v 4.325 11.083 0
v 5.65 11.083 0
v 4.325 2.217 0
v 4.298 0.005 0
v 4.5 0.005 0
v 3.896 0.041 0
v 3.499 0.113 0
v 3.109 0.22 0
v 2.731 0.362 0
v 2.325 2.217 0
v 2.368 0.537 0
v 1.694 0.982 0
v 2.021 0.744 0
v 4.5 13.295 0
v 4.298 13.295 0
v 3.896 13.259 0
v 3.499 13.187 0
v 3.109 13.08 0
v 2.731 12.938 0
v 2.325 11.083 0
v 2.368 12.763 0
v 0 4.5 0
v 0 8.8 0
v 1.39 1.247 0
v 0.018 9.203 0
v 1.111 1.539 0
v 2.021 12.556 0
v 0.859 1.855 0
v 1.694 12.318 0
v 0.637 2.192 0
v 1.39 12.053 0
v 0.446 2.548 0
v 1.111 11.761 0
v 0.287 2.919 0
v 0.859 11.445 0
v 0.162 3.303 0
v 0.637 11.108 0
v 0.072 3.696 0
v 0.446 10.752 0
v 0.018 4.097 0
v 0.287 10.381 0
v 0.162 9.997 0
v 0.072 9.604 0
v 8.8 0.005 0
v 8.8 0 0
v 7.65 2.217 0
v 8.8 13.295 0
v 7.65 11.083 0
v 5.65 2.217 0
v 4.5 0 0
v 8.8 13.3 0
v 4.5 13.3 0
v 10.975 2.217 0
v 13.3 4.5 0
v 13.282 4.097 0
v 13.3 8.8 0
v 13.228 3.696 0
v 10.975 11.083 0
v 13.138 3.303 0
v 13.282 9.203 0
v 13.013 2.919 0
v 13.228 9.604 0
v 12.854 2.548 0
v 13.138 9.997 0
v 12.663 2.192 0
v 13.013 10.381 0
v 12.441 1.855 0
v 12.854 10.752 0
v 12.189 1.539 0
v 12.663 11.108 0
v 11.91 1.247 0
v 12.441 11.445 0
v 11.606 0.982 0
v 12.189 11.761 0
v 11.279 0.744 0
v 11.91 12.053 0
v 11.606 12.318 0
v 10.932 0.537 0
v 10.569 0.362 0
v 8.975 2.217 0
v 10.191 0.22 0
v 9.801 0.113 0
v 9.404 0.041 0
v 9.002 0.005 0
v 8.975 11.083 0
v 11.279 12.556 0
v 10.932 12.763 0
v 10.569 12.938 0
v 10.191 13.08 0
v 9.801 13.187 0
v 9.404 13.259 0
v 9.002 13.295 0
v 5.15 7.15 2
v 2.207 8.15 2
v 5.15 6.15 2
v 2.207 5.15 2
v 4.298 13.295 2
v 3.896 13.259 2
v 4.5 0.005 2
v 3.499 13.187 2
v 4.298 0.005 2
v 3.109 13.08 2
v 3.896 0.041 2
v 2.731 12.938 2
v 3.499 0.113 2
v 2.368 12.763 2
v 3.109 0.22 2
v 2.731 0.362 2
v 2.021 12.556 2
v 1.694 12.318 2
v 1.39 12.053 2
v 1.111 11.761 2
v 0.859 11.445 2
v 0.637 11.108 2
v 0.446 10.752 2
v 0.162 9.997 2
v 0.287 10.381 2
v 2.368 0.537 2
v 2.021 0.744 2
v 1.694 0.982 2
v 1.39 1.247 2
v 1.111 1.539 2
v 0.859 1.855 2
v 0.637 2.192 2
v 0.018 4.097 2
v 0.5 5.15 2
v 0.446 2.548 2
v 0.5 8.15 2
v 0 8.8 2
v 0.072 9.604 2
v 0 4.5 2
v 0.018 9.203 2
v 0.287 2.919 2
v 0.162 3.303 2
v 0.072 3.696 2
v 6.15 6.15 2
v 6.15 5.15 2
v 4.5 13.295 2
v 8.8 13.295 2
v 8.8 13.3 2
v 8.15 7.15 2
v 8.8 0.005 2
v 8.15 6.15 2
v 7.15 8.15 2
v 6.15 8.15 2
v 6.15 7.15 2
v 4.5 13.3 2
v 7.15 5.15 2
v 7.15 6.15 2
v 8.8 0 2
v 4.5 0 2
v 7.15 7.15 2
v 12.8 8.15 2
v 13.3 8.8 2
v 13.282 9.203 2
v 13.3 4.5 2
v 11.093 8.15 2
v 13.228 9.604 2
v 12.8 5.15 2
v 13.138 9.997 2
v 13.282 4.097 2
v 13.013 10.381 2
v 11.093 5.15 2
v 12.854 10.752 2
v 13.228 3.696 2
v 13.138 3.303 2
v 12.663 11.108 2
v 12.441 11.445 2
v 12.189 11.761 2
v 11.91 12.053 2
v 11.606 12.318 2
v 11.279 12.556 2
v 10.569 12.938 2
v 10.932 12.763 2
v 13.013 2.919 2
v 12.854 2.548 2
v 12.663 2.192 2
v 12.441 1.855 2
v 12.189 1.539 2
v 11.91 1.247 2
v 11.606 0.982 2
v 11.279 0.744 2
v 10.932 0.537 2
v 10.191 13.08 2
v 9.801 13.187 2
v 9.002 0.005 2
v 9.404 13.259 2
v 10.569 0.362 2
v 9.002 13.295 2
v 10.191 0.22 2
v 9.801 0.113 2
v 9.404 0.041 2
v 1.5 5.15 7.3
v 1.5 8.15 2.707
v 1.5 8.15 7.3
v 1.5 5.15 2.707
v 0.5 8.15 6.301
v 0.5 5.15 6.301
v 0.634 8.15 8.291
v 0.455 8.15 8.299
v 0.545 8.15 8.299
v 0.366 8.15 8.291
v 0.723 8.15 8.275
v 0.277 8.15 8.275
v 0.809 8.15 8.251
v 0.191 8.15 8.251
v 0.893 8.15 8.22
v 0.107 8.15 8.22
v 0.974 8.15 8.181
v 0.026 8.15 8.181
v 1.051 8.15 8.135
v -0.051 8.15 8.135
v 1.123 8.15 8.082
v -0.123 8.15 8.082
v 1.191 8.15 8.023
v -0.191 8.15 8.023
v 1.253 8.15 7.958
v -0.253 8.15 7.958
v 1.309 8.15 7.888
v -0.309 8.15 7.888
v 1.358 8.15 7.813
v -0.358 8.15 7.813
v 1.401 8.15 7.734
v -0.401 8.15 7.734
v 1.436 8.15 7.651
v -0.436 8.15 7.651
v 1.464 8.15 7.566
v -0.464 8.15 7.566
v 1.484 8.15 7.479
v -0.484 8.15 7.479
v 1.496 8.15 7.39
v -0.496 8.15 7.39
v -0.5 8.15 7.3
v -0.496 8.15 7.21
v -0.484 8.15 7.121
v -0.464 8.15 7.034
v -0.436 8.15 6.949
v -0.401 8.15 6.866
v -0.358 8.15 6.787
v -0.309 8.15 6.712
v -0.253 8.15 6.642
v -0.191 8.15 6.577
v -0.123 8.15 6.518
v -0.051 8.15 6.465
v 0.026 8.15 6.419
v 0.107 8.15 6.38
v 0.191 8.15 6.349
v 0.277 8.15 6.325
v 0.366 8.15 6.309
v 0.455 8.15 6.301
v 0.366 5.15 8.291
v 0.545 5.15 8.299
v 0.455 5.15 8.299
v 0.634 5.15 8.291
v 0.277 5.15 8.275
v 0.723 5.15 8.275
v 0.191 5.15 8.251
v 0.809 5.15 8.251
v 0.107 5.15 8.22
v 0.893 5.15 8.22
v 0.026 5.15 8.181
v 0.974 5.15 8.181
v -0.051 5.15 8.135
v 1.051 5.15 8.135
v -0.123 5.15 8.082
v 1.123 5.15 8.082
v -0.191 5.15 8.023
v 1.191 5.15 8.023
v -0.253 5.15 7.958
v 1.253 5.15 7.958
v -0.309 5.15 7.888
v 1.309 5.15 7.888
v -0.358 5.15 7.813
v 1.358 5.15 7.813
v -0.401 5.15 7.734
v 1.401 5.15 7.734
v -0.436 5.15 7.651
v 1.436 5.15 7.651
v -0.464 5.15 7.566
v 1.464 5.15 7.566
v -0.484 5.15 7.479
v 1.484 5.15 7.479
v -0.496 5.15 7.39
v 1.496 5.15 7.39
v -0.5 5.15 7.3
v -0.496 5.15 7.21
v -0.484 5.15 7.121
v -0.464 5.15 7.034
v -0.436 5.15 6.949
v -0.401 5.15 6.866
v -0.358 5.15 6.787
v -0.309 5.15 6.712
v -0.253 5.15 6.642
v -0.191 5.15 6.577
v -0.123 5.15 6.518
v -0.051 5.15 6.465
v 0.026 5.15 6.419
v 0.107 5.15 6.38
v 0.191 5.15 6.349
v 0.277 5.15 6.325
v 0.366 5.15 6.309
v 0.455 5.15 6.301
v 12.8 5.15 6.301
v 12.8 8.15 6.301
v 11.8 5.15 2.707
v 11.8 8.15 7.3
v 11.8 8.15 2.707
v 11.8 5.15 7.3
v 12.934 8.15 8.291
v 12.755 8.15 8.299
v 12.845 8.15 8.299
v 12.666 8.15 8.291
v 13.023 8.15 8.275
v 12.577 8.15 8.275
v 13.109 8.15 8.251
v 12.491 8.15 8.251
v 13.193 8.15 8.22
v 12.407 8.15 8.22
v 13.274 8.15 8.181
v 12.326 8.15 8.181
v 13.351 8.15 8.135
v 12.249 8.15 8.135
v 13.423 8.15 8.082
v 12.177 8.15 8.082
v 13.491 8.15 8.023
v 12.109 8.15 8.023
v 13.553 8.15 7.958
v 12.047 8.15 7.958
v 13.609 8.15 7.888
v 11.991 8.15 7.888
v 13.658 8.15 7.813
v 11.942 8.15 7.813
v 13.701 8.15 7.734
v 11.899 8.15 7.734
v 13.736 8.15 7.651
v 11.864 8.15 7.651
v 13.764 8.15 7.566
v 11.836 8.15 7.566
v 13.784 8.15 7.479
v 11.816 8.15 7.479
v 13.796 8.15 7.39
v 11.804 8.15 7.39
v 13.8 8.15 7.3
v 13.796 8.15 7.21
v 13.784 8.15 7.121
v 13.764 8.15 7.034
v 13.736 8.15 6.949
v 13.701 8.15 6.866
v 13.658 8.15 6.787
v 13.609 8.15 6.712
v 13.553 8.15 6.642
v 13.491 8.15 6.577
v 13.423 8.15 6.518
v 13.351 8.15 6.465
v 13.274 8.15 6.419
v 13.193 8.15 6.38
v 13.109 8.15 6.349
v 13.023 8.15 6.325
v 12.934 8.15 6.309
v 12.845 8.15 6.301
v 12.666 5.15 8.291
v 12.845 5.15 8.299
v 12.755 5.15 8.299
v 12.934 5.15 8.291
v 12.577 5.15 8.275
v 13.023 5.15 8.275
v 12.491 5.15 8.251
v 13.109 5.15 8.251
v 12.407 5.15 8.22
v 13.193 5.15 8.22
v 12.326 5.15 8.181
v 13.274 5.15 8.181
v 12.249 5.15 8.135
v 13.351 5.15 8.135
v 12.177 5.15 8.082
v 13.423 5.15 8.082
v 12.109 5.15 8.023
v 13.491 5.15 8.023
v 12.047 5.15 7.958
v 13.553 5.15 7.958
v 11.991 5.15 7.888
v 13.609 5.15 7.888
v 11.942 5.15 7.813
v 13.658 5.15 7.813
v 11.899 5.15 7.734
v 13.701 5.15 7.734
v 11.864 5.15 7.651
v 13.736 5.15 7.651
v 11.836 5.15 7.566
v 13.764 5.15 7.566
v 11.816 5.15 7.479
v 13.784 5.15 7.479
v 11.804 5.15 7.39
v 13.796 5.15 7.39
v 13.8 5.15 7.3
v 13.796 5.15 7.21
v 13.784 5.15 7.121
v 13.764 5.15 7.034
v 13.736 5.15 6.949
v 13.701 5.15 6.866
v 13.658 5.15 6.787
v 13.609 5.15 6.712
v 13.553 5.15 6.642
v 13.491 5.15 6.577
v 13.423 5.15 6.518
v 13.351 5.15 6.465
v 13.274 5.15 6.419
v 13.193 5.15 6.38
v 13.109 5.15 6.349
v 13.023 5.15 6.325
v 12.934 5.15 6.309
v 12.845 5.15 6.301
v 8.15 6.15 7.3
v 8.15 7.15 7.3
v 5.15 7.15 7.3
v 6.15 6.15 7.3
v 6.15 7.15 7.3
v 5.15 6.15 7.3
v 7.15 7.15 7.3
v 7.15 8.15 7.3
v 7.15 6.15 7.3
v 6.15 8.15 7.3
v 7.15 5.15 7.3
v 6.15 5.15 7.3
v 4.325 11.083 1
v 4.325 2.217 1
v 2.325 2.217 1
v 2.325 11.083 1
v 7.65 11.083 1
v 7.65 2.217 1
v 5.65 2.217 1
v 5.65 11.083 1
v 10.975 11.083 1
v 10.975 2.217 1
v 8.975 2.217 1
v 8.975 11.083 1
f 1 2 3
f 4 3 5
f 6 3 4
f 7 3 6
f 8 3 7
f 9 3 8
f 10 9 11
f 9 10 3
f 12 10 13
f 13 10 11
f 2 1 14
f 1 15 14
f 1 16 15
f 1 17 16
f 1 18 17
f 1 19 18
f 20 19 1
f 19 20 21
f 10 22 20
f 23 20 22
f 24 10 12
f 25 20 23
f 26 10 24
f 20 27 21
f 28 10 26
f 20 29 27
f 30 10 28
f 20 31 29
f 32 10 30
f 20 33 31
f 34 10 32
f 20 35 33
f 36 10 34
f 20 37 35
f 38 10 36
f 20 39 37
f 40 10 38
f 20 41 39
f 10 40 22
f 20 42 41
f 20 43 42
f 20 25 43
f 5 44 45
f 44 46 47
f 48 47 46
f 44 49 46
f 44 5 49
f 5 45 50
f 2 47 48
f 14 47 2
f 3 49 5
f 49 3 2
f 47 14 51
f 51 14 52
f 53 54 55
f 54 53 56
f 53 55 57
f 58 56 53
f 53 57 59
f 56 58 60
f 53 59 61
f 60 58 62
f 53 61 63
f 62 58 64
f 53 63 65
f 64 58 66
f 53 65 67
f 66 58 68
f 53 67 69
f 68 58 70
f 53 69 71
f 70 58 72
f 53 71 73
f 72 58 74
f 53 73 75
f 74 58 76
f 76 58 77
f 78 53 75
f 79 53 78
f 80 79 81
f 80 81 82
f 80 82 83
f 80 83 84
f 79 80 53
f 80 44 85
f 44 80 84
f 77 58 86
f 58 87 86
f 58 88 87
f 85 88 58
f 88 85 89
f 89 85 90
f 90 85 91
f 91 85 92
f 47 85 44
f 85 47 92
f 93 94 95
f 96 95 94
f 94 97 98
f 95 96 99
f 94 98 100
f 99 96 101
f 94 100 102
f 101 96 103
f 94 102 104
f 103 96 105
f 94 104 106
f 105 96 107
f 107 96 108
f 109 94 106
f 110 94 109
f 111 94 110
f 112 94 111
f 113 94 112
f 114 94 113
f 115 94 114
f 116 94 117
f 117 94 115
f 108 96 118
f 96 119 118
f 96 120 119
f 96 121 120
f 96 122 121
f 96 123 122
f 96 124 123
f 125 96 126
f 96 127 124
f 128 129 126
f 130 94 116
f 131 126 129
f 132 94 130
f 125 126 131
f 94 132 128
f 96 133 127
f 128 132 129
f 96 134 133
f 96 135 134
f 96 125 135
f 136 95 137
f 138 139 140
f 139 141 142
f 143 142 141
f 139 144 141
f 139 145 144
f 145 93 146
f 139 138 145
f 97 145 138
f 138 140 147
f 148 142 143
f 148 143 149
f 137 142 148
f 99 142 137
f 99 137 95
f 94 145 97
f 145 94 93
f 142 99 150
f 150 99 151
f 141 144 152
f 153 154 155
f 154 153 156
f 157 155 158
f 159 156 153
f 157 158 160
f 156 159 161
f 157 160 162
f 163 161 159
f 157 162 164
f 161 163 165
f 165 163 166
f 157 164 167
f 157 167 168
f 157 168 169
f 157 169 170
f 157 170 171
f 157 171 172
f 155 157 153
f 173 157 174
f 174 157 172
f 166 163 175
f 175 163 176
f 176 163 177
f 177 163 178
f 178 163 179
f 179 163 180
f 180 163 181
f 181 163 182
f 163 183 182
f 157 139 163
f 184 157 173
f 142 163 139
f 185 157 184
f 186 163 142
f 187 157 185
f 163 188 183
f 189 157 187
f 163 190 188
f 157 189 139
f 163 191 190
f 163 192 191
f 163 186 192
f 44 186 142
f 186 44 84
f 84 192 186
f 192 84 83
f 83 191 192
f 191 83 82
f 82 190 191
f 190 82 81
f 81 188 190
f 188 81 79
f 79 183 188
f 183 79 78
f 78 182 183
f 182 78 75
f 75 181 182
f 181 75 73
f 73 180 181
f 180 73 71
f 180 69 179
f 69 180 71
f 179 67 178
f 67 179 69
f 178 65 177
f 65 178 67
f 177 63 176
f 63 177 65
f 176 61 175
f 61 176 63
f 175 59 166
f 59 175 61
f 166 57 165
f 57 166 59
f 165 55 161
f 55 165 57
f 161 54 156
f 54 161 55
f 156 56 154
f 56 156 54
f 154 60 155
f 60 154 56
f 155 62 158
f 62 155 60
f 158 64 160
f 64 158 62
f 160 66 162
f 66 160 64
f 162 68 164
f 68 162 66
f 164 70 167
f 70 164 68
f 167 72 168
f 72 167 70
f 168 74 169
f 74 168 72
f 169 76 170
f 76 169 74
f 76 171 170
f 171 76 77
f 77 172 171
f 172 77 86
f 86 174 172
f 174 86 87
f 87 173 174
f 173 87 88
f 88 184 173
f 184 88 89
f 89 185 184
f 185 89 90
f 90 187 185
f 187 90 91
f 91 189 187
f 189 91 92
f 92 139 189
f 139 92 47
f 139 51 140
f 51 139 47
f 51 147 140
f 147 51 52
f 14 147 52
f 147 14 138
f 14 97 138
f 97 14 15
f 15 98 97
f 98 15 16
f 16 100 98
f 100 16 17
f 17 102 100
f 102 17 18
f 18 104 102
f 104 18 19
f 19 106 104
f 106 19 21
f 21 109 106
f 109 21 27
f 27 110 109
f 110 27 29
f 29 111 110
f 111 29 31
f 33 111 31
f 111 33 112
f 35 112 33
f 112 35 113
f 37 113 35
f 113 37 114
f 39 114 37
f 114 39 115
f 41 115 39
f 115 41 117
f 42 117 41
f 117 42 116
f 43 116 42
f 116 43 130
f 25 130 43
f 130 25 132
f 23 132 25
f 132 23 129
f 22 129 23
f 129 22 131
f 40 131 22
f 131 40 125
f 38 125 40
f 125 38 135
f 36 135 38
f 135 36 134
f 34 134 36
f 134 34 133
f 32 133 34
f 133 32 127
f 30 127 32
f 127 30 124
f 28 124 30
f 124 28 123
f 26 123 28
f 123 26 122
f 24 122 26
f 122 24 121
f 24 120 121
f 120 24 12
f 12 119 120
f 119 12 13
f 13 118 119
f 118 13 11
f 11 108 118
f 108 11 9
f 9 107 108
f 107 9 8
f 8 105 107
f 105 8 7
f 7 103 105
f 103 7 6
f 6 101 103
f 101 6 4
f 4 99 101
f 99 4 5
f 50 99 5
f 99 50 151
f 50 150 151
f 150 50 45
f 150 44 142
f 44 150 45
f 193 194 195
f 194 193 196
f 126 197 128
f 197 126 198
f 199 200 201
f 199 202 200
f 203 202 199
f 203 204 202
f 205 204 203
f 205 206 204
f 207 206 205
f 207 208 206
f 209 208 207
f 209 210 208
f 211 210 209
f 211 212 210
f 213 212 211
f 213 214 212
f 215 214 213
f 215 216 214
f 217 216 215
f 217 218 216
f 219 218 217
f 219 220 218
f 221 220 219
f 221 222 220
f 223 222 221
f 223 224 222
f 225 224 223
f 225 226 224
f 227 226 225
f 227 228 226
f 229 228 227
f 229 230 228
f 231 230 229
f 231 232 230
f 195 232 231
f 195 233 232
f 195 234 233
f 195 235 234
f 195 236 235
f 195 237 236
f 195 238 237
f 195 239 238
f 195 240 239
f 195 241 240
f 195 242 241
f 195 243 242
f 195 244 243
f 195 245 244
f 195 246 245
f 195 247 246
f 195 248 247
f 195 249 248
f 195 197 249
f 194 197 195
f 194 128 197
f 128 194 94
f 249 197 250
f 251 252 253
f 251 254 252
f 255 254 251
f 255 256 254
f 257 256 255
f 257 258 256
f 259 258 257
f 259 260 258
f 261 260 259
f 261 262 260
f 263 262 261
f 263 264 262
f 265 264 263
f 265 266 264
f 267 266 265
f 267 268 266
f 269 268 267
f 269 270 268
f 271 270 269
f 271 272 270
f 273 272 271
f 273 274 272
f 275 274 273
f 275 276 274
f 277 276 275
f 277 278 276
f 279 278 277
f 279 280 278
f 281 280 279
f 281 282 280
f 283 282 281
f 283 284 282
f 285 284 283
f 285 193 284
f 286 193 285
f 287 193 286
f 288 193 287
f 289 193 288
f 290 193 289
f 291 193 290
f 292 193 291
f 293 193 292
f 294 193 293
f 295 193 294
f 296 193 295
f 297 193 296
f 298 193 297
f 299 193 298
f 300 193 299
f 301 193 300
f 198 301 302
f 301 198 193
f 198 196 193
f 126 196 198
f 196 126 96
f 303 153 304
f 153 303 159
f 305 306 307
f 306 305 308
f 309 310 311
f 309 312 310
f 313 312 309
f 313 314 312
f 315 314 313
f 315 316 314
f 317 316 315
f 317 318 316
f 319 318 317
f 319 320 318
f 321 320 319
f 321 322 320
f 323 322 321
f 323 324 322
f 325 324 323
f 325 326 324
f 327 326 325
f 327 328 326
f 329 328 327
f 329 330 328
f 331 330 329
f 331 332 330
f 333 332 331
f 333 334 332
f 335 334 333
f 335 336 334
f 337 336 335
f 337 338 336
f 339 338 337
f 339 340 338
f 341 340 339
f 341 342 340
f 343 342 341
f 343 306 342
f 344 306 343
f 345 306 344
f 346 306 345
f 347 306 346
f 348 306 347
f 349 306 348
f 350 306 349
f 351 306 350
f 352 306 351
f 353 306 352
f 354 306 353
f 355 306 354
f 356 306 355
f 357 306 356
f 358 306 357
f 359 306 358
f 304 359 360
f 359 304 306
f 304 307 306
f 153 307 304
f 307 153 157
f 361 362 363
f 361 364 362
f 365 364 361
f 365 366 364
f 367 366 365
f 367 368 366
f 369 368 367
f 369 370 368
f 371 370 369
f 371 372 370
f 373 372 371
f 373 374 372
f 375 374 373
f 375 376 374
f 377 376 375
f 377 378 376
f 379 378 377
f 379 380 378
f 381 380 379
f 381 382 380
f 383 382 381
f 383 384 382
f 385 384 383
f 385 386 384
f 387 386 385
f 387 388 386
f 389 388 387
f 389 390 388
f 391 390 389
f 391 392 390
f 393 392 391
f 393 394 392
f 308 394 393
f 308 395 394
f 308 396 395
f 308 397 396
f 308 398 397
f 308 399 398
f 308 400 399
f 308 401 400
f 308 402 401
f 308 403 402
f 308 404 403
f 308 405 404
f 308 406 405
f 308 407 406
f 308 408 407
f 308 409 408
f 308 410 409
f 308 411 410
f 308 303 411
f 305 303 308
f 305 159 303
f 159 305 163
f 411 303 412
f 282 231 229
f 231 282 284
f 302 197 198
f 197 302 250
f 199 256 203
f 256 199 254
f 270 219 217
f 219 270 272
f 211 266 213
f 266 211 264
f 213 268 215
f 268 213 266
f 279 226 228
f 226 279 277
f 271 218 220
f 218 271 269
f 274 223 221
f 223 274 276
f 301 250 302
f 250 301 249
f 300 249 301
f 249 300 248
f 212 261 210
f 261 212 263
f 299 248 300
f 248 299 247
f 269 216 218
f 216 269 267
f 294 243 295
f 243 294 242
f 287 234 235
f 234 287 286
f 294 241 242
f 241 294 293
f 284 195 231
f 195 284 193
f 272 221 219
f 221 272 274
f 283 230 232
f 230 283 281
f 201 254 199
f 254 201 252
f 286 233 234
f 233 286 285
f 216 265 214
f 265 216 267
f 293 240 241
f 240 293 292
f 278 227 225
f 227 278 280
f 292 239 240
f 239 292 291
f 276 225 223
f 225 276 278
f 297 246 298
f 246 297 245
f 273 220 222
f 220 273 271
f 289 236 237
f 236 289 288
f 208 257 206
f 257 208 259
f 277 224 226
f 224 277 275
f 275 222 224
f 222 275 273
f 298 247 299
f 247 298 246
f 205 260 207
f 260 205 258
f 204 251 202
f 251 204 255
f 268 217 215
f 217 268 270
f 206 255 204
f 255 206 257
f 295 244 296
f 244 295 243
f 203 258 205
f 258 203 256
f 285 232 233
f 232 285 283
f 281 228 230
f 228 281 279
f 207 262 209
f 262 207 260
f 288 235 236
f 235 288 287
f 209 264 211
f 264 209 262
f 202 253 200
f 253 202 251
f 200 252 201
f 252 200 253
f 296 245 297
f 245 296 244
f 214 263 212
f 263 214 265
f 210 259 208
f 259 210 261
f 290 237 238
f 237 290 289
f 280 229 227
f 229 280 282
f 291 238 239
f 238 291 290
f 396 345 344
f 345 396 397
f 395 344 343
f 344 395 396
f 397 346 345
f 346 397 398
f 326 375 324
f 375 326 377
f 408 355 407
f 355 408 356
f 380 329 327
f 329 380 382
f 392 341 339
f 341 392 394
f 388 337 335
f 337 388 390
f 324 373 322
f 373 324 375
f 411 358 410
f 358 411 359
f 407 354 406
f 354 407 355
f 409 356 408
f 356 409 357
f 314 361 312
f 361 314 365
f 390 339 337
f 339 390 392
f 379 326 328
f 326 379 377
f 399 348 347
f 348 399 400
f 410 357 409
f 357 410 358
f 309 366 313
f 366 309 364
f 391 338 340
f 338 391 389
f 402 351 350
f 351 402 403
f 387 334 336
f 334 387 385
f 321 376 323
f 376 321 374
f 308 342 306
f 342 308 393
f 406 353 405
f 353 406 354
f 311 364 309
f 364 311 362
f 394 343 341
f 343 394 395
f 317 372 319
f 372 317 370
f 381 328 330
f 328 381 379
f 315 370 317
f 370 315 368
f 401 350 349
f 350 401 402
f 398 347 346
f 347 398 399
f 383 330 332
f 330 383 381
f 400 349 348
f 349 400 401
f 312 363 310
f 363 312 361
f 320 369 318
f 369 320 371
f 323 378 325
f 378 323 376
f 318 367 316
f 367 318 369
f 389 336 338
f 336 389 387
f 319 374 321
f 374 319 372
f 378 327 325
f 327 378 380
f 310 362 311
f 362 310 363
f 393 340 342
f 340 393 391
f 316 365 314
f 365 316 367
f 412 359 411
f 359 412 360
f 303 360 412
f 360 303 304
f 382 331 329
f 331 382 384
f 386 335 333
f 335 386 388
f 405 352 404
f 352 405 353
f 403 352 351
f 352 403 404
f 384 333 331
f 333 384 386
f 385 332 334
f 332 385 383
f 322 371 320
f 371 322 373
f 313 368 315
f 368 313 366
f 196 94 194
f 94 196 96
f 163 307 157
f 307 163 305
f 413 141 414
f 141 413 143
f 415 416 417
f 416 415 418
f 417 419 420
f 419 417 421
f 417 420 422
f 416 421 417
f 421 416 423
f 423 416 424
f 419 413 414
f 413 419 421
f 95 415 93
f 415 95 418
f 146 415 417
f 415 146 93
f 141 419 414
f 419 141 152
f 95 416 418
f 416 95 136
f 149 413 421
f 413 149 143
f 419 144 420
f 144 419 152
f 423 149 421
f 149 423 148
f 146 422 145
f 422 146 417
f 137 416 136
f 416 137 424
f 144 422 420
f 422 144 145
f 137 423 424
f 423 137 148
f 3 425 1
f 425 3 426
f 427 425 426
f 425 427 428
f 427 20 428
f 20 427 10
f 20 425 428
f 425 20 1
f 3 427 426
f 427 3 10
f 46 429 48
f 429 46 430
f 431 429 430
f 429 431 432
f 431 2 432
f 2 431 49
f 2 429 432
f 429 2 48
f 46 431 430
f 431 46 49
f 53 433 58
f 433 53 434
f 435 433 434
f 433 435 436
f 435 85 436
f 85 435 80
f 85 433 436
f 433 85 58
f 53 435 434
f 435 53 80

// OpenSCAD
// Gombik z Holiaceho Strojceka
// 20260707, Ondrej DURAS (dury) NOKIA

/* [Config] */
preview="basic"; // [basic,plate]
$fn=70;  // [10:10:100]
spi=0.1; // odstup kolika
spo=0.1; // odstup diery
spp=5.0; // odstup medzi suciastkami na vyrobnej doske
nox=4;   // pocet gombikov v smere X
noy=2;   // pocet gombikov v smere Y

// hrana stvorca
butWidth=13.3;
// vyska gombika od podlozky po stred stredoveho kriza. okrajove kolicky su este o polovicu hrubky kolicka (polomer valca) vyssie
butHight=7.3;  
// zaoblenie hran stvorca
butRound=4.5;  
// hrana stredoveho kriza
butCross=3.0;
// hrubka hrany stredoveho kriza
butCrosI=1.0;
// hrubka materialu zakladnej dosky tlacitka
butTickB=2.0;
// hrubka postrannych istiacich kolickov smerom do vnutra stvorca
butTickI=1.0; // 1.5 bolo hrube
// polomer valceka zachytu na istiacich kolickoch, musi byt mesi ako butTickI
butTickX=1.0;
// hrubka postrannych kolickov po hrane tlacitka
butTickH=3.0;  // 4.0 bolo hrube
colorButtonX="#b0b050"; // farba materialu gombika
colorButtonY="#50b0b0"; // farba materialu gombika


module hcButton_OFFv1(bw=butWidth,bh=butHight,br=butRound,bcs=butCross,bci=butCrosI,btb=butTickB,bti=butTickI,btx=butTickX,bth=butTickH) {
    b1=bw-br;
    r1=br+1;
    difference() {
    color(colorButtonX) 
    union() {
        linear_extrude(butTickB) {
        union() {
        difference() {
            square(bw);
            translate([-1,-1]) square(r1); // lavy predny vyrez pre zaoblenie
            translate([b1,-1]) square(r1); // pravy predny
            translate([-1,b1]) square(r1); // lavy zadny
            translate([b1,b1]) square(r1); // pravy zadny
        } // diff
            translate([br,br]) circle(r=br); // lave predne zaoblenie
            translate([b1,br]) circle(r=br); // prave predne
            translate([br,b1]) circle(r=br); // lave zadne
            translate([b1,b1]) circle(r=br); // prave zadne
       
 
        } // union
        } // extr
        translate([0,bw/2-bth/2,0])      cube([bti,bth,bh]);  // lava palicka
        translate([bw-bti,bw/2-bth/2,0]) cube([bti,bth,bh]);  // prava palicka
        translate([0,bw/2-bth/2,bh-btx]) rotate([-90,0,0]) cylinder(h=bth,r=btx);  // zachyt na lavej palicke      
        translate([bw,bw/2-bth/2,bh-btx]) rotate([-90,0,0]) cylinder(h=bth,r=btx); // zachyt na pravej palicke

        translate([bw/2-bcs/2,bw/2-bci/2,0]) cube([bcs,bci,bh]);
        translate([bw/2-bci/2,bw/2-bcs/2,0]) cube([bci,bcs,bh]);
    }  // uniV
        for(i=[1:1:3]) {
          color(colorButtonY)  translate([bw/4*i-btb/2,bw/6,-0.001]) cube([btb,bw/3*2,btb/2+0.001]);
        }
    } // diffV
}     

module hcButton(bw=butWidth,bh=butHight,br=butRound,bcs=butCross,bci=butCrosI,btb=butTickB,bti=butTickI,btx=butTickX,bth=butTickH) {

// POCITANIE : "PRUZNY VYREZ"
// ak B je polovica sirky vyrezu a D je hlbka prepadu vyrezu, potom 
// C je polomer valca, ktory treba od kvadra odrezat, aby na nom vznikol pruzny vyrez
// C=(B*B-D*D)/2D+D ... vypocet polomeru valca
// A - vzdialenost stredu valca od (zatial) rovnej hrany kvadra do ktorej sa vyrezava "pruzny vyrez"
// A = C-D (polomer valca - hlbka vyhlbenia)
// alebo pocitajme najprv vzdialenost valca od kvadra A=(BB-DD)/2D
// a potom jeho polomer ako C=A+D

// v kontexte gombika pre holiaci strojcek:
// D=butTickI/2 ... bti/2 ,teda polovica hrubky palicky/istiaceho kolicka ...teda cca 0.75mm
// B=2*butHight/6 ... bh/3
// A=(bh/3*bh/3-bti/2*bti/2)/2*bti/2 = (bh*bh/6-bti*bti/4)/bti = (bh*bh/6/bti)-(bti/4)
// C = A + D = A + bti/2

    b1=bw-br; // konstanty pre vypocitanie zaoblenia
    r1=br+1;
    //aa=bh*bh/bti/6-bti/4; // vzdialenost valca pre pruzny vyrez
    sf=bti/2;             // hlbka pruzneho vyrezu, ale zaroven posun(shift) od okraja gombika
    aa=bh*bh/sf/3-sf/2;   // vzdialenost valca pruzneho vyrezu po zjednoduseni vypoctu
    cc=aa+bti/2;          // polomer valca pruzneho vyrezu

    difference() {
    color(colorButtonX) 
    union() {
        linear_extrude(butTickB) {
        union() {
        difference() {
            square(bw);
            translate([-1,-1]) square(r1); // lavy predny vyrez pre zaoblenie
            translate([b1,-1]) square(r1); // pravy predny
            translate([-1,b1]) square(r1); // lavy zadny
            translate([b1,b1]) square(r1); // pravy zadny
        } // diff
            translate([br,br]) circle(r=br); // lave predne zaoblenie
            translate([b1,br]) circle(r=br); // prave predne
            translate([br,b1]) circle(r=br); // lave zadne
            translate([b1,b1]) circle(r=br); // prave zadne
       
 
        } // union
        } // extr
        translate([sf,bw/2-bth/2,0])      cube([bti,bth,bh]);  // lava palicka
        translate([bw-bti-sf,bw/2-bth/2,0]) cube([bti,bth,bh]);  // prava palicka
        rxx=btx*2/3; // polomer zachytneho valca na konci kolicka
        translate([sf,bw/2-bth/2,bh]) rotate([-90,0,0]) cylinder(h=bth,r=btx);  // zachyt na lavej palicke      
        translate([bw-sf,bw/2-bth/2,bh]) rotate([-90,0,0]) cylinder(h=bth,r=btx); // zachyt na pravej palicke

        translate([sf+bti,bw/2,btb]) rotate([0,45,0]) cube([btb/2,bth,btb/2], center=true);  //opora lavej palicky
        translate([bw-bti-sf,bw/2,btb])  rotate([0,45,0]) cube([btb/2,bth,btb/2], center=true);  //opora pravej palicky

        translate([bw/2-bcs/2,bw/2-bci/2,0]) cube([bcs,bci,bh]); //stredovy kriz - hrana zlava do prava
        translate([bw/2-bci/2,bw/2-bcs/2,0]) cube([bci,bcs,bh]); // stredovy kriz - hrana zpredu do zadu
    }  // uniV
        for(i=[1:1:3]) {  // tri vyhlbenia pre vytiahnutie tlacitka v pripade, ze ho bude treba vymenit
          color(colorButtonY)  translate([bw/4*i-btb/2,bw/6,-0.001]) cube([btb,bw/3*2,btb/2+0.001]);
        }
    } // diffV
}     

module preview(preview=preview) {
    if(preview=="basic") { hcButton(); }
    if(preview=="plate") {
        for(y=[0:1:noy-1]) for(x=[0:1:nox-1]) { 
            translate([x*(butWidth+spp),y*(butWidth+spp),0]) hcButton(); 
        }
    }
}

/* [Preview] */
preview();

// --- end ---
      
